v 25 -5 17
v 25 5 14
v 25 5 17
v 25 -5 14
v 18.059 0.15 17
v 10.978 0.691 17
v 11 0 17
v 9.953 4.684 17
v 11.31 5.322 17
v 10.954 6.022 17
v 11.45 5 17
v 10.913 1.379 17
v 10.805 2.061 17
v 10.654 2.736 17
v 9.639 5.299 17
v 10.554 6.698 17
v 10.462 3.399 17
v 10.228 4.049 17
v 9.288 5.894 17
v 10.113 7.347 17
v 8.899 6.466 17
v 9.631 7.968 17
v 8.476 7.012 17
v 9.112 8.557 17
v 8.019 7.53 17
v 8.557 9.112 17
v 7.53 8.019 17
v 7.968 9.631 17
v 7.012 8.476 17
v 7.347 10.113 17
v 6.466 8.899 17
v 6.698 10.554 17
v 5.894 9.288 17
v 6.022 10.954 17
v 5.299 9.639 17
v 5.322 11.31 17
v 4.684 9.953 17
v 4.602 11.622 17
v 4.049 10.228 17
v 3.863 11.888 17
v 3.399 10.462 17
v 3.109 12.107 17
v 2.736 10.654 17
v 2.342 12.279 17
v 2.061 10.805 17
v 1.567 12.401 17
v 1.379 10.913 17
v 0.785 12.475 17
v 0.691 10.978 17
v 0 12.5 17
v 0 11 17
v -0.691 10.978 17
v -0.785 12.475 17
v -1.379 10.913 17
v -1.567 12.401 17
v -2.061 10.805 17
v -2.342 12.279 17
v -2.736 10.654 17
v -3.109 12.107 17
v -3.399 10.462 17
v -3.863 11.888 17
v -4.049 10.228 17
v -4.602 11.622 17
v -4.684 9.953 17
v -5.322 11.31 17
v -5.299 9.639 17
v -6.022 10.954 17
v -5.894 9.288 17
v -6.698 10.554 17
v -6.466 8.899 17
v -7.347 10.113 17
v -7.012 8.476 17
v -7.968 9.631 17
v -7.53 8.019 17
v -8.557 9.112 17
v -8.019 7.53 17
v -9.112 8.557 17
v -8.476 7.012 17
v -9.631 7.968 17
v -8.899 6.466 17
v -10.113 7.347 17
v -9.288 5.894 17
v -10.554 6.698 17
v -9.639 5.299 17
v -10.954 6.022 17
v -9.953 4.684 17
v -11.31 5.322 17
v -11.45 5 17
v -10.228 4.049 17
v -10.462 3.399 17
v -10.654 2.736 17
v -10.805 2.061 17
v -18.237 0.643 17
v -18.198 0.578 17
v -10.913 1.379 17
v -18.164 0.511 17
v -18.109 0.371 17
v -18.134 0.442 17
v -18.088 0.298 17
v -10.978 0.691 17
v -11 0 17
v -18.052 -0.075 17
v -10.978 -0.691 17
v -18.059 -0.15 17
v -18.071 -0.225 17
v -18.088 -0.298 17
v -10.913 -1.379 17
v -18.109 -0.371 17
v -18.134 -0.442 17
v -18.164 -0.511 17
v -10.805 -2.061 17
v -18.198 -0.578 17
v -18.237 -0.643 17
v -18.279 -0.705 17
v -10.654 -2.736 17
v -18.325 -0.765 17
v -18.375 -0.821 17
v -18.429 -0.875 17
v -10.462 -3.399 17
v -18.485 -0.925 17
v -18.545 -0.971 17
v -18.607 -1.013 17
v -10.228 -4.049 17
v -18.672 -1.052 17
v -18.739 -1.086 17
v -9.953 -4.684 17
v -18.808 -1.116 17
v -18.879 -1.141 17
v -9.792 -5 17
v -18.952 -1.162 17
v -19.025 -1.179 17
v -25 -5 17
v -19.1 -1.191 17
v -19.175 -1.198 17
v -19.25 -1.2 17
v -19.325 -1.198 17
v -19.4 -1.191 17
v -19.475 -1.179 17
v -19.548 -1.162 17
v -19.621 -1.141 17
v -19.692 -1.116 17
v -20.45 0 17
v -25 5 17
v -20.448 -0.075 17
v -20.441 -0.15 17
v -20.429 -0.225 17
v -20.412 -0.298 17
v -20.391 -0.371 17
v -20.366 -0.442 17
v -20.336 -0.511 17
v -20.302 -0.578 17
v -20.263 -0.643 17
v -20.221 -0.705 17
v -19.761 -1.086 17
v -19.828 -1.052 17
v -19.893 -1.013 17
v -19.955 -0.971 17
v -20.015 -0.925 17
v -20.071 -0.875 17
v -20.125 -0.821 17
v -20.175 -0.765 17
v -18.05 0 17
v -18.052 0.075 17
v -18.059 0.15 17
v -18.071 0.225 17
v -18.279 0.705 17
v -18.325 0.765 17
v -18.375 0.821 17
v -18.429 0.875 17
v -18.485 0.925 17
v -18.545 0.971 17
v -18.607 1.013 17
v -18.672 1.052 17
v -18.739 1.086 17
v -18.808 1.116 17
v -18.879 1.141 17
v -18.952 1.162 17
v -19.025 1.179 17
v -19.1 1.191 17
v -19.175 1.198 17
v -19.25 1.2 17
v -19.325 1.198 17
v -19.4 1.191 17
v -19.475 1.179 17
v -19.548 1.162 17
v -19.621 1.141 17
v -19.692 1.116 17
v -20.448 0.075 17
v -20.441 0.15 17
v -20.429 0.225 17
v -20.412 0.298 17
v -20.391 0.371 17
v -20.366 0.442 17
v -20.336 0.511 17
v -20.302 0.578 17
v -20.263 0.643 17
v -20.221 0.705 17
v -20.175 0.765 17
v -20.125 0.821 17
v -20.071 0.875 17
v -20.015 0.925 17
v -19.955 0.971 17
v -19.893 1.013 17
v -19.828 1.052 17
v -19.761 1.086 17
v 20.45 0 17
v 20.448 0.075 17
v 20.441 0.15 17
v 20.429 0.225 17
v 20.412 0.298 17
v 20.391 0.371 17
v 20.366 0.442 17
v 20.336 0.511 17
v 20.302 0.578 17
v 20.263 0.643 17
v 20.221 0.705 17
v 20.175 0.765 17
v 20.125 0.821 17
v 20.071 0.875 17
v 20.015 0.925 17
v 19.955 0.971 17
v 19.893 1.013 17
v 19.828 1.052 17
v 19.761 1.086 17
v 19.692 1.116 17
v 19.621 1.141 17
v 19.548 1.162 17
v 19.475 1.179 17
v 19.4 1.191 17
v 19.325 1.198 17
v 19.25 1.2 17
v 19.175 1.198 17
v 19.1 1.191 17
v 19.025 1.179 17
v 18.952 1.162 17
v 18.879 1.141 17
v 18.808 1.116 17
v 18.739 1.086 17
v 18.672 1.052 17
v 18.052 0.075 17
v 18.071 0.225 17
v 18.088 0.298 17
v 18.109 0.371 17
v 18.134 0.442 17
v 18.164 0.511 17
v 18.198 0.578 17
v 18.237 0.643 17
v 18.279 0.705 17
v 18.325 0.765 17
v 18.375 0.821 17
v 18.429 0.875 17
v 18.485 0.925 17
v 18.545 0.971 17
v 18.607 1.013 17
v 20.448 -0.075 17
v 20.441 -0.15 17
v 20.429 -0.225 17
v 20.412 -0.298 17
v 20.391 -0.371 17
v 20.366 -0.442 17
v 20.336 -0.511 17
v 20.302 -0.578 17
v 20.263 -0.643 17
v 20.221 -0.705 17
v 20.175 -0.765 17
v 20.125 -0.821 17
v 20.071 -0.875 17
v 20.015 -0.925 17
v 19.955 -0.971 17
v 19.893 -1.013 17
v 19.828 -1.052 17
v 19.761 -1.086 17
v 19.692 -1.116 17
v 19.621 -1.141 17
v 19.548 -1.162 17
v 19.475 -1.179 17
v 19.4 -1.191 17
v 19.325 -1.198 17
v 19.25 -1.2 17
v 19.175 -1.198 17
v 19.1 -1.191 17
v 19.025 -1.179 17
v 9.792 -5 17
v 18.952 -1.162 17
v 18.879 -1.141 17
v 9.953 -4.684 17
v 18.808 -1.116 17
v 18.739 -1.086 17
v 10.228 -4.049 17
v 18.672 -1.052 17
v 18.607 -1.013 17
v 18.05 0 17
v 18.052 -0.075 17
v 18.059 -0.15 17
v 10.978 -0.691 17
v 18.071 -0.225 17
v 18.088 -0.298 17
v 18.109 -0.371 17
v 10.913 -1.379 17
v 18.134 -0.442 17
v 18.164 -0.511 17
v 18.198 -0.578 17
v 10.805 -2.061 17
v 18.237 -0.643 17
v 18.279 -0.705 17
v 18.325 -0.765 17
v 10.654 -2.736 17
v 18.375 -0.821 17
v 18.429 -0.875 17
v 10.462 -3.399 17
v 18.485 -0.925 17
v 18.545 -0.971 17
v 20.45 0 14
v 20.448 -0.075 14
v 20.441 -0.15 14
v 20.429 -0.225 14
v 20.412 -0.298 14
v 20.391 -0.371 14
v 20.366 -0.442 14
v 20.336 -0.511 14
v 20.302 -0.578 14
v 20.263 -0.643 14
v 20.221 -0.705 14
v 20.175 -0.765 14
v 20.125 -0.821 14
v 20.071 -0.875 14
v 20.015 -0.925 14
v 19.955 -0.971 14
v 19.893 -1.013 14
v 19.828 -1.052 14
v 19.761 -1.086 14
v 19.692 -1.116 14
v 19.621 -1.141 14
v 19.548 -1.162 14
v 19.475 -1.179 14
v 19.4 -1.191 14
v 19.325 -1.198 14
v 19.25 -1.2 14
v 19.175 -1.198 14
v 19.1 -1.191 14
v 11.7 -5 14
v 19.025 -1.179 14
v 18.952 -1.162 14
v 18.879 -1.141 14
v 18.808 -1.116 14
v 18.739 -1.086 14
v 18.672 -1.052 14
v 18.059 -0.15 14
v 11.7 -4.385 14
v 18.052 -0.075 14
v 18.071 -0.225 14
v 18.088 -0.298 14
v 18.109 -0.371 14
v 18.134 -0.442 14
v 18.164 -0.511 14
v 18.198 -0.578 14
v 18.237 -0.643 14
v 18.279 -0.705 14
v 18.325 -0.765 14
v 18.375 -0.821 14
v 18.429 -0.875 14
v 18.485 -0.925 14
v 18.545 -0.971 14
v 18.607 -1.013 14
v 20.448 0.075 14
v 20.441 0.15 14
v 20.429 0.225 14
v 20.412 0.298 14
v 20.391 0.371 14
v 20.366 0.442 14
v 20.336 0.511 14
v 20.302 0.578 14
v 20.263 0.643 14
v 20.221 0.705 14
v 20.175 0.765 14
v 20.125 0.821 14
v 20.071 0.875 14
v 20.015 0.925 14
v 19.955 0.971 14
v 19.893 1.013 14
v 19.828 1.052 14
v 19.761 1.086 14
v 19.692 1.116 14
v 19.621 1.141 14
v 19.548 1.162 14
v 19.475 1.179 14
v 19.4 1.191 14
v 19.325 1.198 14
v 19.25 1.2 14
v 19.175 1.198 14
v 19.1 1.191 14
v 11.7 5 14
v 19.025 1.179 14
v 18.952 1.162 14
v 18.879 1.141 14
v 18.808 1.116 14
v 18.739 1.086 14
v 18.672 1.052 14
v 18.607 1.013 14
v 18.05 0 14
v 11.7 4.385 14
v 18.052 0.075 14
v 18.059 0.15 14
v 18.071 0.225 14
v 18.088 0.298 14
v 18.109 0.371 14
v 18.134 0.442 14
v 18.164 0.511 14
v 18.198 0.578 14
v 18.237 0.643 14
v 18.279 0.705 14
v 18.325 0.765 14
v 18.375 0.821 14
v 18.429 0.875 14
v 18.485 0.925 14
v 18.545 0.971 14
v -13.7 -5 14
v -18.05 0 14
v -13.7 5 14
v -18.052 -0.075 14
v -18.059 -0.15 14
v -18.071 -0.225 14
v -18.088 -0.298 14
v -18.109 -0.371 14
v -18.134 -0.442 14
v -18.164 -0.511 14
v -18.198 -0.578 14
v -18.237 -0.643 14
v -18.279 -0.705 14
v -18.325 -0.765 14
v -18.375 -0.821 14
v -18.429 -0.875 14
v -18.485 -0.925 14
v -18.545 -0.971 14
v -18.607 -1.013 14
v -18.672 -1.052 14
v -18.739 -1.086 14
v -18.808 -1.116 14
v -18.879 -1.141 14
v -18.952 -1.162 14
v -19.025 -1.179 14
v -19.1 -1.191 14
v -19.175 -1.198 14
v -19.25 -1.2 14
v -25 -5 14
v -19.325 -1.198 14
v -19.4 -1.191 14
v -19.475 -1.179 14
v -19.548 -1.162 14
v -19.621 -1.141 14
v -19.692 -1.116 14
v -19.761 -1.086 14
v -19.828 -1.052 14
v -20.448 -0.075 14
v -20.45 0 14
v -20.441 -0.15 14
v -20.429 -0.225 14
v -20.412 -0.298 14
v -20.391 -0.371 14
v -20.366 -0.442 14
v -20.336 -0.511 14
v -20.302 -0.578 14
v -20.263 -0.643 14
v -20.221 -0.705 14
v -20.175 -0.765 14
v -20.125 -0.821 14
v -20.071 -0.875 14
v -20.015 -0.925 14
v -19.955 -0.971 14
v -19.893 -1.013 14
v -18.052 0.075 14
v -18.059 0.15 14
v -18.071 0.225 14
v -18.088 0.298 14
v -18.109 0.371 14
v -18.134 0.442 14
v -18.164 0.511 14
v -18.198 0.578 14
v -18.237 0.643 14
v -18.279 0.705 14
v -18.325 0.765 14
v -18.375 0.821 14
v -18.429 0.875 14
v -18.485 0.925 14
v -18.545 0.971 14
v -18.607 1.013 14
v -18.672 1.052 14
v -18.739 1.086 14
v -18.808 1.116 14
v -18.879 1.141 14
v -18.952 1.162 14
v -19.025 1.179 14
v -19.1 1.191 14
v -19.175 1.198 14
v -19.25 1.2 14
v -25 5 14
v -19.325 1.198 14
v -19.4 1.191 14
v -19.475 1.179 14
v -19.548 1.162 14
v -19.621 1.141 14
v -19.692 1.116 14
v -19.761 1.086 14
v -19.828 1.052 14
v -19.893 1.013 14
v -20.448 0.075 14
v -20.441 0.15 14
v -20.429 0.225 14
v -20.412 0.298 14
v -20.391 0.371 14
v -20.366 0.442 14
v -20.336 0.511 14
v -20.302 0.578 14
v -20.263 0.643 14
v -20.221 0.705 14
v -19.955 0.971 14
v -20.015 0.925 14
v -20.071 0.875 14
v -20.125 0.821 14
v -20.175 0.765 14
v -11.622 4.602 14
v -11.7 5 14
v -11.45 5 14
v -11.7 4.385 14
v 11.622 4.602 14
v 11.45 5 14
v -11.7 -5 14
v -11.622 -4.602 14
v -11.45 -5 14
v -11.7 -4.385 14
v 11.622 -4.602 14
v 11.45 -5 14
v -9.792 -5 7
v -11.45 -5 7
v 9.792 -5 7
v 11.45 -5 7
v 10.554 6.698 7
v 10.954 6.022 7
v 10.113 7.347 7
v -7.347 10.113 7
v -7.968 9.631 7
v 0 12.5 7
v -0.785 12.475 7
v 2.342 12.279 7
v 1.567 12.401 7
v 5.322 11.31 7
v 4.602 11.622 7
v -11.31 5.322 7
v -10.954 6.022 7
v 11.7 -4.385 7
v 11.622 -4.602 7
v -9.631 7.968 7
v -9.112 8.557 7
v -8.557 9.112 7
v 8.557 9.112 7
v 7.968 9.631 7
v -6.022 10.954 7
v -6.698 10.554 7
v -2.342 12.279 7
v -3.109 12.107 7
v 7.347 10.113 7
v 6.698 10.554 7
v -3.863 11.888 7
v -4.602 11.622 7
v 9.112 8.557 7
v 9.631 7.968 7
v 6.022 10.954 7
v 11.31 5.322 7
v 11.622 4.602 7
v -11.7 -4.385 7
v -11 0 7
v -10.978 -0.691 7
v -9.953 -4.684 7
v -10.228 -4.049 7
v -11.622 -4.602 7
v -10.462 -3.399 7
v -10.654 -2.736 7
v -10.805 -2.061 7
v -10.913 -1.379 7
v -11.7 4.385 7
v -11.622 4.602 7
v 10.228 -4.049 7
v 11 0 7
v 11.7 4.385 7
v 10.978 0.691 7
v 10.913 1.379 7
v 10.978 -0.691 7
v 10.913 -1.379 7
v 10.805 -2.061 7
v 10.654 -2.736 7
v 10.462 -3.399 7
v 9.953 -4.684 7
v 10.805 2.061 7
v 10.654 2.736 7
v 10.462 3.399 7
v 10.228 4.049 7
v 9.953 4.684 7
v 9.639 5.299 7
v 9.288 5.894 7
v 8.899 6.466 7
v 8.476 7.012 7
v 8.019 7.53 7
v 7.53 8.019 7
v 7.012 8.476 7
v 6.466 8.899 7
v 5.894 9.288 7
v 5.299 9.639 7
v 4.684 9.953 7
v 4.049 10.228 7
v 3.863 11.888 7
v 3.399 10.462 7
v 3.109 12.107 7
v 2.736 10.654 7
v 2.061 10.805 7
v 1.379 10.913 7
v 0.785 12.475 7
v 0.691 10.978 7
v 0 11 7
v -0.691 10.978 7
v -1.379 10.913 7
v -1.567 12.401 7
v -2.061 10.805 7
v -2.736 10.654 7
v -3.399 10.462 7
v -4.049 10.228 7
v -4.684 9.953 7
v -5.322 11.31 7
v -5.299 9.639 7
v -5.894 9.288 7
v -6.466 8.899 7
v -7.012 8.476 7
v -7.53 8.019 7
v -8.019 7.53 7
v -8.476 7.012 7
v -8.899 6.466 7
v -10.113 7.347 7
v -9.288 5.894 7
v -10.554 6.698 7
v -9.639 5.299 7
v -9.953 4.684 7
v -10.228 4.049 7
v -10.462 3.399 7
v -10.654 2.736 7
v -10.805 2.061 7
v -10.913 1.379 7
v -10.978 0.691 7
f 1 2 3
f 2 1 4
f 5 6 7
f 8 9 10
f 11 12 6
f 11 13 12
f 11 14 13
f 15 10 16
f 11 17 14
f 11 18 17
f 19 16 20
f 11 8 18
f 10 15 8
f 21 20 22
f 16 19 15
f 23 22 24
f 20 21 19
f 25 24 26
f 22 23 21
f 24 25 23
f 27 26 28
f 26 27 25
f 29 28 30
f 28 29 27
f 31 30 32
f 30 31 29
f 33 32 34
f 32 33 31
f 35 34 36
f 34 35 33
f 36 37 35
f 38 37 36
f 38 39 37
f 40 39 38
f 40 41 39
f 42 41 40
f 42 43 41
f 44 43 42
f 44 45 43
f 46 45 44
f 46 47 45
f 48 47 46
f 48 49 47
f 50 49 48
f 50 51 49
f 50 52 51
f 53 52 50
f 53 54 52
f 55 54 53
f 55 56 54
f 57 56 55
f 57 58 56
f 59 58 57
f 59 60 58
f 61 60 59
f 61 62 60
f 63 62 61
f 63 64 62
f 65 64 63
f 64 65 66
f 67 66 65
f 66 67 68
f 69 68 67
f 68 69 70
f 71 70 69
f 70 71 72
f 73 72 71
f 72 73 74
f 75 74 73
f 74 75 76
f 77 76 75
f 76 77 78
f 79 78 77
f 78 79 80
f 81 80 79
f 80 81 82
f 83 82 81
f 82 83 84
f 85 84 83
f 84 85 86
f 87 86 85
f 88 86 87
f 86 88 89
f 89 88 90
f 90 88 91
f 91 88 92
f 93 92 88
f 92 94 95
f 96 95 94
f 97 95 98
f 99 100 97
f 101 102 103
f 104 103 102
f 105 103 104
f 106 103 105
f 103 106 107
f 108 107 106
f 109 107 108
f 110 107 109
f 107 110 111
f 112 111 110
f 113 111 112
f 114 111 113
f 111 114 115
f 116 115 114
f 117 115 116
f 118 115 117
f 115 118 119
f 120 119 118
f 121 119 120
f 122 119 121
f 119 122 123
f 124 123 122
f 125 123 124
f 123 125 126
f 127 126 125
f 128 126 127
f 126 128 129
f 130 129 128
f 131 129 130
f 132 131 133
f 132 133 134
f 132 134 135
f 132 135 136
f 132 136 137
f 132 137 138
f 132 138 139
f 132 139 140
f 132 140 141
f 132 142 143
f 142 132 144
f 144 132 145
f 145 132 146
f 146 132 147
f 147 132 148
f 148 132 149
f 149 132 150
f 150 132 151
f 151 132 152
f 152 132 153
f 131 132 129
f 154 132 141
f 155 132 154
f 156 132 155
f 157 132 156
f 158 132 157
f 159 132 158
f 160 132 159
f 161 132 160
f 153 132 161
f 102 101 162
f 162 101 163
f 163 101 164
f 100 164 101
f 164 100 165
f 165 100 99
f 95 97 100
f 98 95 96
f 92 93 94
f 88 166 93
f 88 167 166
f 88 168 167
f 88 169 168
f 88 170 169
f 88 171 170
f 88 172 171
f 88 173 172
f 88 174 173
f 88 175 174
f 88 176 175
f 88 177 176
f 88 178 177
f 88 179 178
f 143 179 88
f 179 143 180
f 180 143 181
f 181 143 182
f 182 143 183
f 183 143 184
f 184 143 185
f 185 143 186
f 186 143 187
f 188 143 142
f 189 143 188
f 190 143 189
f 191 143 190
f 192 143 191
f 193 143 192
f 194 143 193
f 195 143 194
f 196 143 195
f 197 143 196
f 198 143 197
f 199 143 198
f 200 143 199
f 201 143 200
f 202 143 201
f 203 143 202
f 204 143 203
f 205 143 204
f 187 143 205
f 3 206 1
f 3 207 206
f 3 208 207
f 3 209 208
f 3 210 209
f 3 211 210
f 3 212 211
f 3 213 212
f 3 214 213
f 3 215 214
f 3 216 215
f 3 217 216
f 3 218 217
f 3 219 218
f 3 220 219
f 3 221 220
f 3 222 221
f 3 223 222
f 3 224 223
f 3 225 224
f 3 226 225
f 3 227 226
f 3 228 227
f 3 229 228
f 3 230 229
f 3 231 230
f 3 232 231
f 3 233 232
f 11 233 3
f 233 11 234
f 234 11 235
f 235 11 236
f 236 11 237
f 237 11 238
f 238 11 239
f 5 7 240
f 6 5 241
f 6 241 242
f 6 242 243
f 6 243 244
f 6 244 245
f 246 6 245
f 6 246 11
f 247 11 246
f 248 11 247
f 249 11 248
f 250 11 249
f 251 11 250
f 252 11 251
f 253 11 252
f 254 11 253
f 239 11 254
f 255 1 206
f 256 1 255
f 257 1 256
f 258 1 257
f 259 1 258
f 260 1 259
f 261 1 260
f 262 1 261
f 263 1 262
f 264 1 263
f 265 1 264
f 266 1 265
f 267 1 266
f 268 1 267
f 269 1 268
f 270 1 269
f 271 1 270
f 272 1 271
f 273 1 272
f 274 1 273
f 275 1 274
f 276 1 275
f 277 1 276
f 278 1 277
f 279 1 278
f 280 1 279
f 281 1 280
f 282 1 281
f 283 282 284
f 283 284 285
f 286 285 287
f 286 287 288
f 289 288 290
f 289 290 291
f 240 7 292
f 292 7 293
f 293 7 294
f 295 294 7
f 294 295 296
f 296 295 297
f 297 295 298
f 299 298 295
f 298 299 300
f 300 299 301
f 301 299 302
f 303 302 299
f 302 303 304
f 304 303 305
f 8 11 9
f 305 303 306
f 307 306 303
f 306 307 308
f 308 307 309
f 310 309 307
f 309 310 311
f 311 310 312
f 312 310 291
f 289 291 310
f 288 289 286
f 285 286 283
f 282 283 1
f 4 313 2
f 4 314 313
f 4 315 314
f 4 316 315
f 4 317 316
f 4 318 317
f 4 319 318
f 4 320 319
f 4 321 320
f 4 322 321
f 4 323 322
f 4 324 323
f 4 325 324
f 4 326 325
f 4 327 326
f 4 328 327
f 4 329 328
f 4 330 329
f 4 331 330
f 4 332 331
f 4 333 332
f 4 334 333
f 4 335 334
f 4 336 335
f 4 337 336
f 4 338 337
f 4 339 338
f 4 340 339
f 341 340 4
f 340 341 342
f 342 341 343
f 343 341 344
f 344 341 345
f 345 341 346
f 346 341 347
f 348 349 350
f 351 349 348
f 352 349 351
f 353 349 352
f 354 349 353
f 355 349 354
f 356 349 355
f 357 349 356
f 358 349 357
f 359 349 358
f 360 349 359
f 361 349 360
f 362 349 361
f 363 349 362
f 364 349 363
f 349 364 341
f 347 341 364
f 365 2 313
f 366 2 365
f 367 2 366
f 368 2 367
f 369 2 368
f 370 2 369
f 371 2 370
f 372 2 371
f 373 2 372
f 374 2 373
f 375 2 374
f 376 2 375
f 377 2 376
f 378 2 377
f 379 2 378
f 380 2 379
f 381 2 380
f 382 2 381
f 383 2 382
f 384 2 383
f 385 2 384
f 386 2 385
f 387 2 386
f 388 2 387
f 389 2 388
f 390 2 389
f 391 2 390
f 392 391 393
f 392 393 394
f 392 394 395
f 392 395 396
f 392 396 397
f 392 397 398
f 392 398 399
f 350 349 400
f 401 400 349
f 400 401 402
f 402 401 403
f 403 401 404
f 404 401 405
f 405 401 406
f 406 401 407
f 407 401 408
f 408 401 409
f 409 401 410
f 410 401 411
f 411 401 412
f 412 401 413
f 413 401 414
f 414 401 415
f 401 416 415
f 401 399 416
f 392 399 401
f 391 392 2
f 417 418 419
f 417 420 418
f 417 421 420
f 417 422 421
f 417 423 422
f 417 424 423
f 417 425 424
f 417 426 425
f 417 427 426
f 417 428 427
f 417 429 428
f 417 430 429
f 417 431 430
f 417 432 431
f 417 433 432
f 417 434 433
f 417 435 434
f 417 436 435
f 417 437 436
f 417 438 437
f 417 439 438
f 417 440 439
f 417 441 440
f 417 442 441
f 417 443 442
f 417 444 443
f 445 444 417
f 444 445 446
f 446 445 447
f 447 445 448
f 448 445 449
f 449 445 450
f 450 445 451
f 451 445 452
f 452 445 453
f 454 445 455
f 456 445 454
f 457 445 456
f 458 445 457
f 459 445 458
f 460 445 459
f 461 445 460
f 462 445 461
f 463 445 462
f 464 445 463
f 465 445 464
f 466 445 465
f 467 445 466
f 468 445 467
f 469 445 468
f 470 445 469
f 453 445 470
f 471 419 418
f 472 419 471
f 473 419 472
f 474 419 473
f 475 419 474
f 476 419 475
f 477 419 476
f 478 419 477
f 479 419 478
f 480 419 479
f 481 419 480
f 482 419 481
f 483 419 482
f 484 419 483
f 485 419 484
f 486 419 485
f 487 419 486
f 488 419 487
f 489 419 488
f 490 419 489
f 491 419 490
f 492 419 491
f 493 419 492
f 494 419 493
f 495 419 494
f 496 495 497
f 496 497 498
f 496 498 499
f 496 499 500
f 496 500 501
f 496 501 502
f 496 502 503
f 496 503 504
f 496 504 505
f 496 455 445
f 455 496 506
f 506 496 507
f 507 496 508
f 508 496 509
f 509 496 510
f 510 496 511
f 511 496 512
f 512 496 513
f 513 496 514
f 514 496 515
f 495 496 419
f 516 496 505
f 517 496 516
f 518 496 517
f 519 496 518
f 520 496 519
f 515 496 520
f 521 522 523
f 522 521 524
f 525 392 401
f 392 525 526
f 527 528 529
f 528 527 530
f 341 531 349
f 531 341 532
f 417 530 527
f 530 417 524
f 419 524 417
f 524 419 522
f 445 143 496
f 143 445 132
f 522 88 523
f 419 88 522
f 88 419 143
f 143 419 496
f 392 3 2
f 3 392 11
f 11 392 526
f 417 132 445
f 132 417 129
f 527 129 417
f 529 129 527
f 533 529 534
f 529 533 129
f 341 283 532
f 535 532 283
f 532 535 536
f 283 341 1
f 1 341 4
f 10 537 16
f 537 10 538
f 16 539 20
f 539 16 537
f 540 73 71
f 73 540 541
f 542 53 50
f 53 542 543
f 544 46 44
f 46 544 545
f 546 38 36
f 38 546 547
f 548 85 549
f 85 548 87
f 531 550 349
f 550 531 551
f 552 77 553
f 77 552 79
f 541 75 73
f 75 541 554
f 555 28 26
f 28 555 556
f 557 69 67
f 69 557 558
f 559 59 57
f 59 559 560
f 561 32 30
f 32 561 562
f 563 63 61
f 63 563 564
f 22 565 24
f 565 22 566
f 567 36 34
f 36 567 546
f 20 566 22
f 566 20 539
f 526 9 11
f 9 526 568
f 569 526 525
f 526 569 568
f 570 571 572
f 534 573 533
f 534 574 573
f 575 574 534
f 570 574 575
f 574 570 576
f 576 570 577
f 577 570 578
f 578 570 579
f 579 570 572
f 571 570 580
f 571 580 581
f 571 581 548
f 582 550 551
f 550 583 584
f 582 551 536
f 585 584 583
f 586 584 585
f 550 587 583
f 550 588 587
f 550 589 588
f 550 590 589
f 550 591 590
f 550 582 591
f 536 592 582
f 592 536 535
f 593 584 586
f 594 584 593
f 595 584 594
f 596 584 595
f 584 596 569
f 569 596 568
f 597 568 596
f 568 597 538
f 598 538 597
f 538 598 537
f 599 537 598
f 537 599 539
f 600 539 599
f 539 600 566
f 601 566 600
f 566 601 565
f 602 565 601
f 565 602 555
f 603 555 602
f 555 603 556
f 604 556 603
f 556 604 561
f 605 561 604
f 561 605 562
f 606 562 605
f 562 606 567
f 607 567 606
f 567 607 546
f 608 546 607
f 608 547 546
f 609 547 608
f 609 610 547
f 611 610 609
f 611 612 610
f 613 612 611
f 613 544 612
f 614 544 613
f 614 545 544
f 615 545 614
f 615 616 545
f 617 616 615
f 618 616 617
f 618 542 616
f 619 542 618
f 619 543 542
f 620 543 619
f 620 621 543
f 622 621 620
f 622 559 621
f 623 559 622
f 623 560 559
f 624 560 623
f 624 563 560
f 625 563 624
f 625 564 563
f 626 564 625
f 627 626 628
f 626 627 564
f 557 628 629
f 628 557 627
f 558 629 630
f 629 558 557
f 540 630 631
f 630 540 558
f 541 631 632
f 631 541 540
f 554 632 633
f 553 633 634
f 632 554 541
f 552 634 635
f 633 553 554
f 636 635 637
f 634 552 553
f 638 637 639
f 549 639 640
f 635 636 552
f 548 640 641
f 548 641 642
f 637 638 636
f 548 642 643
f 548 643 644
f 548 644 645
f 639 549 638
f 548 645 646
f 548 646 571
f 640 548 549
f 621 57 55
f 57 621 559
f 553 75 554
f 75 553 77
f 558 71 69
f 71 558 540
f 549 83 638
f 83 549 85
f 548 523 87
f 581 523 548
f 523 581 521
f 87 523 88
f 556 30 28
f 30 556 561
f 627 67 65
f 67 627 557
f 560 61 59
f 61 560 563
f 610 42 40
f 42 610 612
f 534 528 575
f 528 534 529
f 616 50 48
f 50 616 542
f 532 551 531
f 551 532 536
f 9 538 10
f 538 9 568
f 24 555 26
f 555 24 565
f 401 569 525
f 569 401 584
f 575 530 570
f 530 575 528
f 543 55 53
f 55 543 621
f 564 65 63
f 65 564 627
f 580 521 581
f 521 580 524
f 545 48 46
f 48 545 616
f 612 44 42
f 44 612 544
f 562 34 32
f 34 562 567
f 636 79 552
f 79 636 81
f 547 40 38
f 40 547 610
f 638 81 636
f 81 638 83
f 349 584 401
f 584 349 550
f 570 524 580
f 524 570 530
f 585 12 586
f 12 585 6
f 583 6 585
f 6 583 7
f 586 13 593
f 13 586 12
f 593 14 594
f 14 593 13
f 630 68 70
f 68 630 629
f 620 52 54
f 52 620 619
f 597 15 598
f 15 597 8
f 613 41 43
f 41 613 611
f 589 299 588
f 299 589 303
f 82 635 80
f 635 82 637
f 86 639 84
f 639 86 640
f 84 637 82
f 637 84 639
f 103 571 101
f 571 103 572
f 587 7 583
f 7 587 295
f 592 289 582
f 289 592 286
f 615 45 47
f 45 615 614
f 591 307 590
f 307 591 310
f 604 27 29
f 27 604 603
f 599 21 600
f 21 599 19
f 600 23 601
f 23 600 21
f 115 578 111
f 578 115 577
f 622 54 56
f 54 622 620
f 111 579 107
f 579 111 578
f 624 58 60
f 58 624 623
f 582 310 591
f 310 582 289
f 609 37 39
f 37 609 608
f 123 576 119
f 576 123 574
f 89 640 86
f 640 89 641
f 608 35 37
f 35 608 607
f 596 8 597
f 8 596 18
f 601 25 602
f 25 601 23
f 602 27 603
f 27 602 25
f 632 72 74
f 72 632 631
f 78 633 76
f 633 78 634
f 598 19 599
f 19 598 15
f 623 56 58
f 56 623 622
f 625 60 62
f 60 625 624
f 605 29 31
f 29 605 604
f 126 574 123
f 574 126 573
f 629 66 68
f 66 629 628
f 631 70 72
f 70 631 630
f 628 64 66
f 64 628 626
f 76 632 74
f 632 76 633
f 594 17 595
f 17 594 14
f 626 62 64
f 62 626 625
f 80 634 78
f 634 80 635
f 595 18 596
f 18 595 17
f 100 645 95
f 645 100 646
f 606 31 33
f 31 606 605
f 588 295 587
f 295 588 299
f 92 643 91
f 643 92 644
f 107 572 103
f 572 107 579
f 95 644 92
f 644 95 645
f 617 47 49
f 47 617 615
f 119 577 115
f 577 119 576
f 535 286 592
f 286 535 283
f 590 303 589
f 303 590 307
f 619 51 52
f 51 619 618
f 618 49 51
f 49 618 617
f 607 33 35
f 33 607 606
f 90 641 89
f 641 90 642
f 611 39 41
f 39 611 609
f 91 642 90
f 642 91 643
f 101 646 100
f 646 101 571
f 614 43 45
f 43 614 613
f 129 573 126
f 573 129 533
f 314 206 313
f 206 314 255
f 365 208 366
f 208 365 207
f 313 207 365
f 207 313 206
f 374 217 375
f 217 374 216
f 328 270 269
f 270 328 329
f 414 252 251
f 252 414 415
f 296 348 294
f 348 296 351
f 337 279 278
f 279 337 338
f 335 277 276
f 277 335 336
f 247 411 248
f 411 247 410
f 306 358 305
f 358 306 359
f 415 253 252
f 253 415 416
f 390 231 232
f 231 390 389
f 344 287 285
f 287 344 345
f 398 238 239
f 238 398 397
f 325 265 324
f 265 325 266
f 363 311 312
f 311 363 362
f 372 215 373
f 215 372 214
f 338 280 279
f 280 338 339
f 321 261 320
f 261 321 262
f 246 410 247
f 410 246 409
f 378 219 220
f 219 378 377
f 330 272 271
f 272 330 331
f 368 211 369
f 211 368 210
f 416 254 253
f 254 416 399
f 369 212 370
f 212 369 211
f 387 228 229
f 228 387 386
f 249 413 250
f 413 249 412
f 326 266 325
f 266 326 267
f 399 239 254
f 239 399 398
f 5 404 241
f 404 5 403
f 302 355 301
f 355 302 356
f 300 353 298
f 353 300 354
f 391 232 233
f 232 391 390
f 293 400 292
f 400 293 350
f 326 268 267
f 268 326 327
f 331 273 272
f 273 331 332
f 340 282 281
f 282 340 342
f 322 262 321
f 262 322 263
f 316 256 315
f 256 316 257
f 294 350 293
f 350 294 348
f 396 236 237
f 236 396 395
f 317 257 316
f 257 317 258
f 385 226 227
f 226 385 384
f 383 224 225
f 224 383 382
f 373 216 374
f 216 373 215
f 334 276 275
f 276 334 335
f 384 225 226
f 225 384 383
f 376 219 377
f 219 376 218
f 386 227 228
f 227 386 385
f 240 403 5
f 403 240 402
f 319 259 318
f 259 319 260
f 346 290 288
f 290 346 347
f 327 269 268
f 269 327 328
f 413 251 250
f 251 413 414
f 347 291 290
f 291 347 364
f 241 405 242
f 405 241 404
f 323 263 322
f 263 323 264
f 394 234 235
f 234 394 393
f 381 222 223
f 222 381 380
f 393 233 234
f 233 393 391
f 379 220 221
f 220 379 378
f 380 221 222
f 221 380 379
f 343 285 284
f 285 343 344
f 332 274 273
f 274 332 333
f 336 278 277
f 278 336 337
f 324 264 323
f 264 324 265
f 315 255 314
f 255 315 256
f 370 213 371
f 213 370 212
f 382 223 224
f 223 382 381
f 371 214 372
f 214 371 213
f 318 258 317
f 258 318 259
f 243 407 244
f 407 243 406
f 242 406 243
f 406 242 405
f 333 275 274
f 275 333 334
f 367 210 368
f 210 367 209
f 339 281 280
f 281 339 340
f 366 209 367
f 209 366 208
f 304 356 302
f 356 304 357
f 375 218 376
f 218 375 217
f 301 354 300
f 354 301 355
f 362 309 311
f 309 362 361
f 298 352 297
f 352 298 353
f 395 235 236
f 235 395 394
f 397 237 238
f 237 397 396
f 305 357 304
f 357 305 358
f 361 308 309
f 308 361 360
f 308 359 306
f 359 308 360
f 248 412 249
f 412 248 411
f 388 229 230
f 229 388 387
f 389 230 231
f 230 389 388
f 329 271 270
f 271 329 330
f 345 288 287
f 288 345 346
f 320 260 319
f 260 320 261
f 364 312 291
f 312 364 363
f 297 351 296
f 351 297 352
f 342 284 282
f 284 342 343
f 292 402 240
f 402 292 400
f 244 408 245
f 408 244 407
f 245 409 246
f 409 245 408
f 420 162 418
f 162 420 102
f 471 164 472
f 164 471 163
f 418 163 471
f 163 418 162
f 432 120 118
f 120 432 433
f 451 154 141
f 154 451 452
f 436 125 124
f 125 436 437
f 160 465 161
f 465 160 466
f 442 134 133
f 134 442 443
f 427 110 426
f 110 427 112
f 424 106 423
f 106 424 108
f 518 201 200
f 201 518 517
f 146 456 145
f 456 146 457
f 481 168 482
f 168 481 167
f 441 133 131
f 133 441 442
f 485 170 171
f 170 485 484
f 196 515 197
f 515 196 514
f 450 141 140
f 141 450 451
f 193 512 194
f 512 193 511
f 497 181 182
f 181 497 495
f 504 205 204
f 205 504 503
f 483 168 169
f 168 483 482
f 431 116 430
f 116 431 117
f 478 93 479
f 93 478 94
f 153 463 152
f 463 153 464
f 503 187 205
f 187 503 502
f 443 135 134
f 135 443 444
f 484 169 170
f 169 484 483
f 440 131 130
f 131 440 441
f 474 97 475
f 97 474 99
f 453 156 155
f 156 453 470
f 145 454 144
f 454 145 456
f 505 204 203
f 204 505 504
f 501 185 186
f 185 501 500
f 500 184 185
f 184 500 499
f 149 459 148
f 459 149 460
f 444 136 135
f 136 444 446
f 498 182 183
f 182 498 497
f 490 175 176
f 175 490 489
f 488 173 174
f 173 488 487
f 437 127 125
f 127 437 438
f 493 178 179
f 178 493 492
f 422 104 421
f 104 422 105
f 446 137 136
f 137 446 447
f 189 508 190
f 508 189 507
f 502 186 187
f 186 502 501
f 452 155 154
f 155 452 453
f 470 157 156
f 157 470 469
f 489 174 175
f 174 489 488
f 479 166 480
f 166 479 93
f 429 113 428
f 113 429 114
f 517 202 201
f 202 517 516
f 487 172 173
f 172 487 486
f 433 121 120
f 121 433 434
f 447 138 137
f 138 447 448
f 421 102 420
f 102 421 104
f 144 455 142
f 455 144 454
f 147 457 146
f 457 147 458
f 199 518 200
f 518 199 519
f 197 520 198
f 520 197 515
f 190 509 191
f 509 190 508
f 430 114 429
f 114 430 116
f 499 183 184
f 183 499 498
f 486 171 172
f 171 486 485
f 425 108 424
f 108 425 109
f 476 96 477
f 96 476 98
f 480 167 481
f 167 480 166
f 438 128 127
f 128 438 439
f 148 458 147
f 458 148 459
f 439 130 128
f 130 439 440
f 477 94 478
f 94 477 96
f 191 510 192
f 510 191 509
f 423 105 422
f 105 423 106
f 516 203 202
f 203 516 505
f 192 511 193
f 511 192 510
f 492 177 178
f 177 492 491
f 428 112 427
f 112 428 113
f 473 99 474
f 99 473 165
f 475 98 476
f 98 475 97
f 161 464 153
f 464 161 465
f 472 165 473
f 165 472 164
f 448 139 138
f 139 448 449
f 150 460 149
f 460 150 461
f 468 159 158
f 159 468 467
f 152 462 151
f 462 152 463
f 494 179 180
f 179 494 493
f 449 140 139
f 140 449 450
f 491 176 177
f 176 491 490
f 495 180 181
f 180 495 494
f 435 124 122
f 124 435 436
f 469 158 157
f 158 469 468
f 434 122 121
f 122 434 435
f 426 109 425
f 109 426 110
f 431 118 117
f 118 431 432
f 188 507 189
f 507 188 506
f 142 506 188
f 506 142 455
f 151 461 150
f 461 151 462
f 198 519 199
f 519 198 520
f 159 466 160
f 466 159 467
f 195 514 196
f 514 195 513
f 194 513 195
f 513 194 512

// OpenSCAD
difference(){
	union(){
        translate([-50/2,-5,14]){
           cube([50,10,3], center=false);
        }

        translate([0,0,7]){
            rotate([0,0,0]){
                cylinder(h=10, r=12.5, $fn=100, center=false);
            }
        }
   
 
	}
	union() {
        translate([11.7,-5,4]){
           cube([20,20,10], center=false);
        }
        translate([-13.7,-5,4]){
           cube([2,20,10], center=false);
        }
        translate([-55/2,-15,-1]){
           cube([55,10,30], center=false);
        }
        translate([0,0,2]){
            rotate([0,0,0]){
                cylinder(h=20, r=11, $fn=100, center=false);
            }
        }

        translate([19.25,0,-1]){
            rotate([0,0,0]){
                cylinder(h=28, r=1.2, $fn=100, center=false);
            }
        }
        translate([-19.25,0,-1]){
            rotate([0,0,0]){
                cylinder(h=28, r=1.2, $fn=100, center=false);
            }
        }
//19.25

//38.5
        //28.8 -28.5

	}
}
